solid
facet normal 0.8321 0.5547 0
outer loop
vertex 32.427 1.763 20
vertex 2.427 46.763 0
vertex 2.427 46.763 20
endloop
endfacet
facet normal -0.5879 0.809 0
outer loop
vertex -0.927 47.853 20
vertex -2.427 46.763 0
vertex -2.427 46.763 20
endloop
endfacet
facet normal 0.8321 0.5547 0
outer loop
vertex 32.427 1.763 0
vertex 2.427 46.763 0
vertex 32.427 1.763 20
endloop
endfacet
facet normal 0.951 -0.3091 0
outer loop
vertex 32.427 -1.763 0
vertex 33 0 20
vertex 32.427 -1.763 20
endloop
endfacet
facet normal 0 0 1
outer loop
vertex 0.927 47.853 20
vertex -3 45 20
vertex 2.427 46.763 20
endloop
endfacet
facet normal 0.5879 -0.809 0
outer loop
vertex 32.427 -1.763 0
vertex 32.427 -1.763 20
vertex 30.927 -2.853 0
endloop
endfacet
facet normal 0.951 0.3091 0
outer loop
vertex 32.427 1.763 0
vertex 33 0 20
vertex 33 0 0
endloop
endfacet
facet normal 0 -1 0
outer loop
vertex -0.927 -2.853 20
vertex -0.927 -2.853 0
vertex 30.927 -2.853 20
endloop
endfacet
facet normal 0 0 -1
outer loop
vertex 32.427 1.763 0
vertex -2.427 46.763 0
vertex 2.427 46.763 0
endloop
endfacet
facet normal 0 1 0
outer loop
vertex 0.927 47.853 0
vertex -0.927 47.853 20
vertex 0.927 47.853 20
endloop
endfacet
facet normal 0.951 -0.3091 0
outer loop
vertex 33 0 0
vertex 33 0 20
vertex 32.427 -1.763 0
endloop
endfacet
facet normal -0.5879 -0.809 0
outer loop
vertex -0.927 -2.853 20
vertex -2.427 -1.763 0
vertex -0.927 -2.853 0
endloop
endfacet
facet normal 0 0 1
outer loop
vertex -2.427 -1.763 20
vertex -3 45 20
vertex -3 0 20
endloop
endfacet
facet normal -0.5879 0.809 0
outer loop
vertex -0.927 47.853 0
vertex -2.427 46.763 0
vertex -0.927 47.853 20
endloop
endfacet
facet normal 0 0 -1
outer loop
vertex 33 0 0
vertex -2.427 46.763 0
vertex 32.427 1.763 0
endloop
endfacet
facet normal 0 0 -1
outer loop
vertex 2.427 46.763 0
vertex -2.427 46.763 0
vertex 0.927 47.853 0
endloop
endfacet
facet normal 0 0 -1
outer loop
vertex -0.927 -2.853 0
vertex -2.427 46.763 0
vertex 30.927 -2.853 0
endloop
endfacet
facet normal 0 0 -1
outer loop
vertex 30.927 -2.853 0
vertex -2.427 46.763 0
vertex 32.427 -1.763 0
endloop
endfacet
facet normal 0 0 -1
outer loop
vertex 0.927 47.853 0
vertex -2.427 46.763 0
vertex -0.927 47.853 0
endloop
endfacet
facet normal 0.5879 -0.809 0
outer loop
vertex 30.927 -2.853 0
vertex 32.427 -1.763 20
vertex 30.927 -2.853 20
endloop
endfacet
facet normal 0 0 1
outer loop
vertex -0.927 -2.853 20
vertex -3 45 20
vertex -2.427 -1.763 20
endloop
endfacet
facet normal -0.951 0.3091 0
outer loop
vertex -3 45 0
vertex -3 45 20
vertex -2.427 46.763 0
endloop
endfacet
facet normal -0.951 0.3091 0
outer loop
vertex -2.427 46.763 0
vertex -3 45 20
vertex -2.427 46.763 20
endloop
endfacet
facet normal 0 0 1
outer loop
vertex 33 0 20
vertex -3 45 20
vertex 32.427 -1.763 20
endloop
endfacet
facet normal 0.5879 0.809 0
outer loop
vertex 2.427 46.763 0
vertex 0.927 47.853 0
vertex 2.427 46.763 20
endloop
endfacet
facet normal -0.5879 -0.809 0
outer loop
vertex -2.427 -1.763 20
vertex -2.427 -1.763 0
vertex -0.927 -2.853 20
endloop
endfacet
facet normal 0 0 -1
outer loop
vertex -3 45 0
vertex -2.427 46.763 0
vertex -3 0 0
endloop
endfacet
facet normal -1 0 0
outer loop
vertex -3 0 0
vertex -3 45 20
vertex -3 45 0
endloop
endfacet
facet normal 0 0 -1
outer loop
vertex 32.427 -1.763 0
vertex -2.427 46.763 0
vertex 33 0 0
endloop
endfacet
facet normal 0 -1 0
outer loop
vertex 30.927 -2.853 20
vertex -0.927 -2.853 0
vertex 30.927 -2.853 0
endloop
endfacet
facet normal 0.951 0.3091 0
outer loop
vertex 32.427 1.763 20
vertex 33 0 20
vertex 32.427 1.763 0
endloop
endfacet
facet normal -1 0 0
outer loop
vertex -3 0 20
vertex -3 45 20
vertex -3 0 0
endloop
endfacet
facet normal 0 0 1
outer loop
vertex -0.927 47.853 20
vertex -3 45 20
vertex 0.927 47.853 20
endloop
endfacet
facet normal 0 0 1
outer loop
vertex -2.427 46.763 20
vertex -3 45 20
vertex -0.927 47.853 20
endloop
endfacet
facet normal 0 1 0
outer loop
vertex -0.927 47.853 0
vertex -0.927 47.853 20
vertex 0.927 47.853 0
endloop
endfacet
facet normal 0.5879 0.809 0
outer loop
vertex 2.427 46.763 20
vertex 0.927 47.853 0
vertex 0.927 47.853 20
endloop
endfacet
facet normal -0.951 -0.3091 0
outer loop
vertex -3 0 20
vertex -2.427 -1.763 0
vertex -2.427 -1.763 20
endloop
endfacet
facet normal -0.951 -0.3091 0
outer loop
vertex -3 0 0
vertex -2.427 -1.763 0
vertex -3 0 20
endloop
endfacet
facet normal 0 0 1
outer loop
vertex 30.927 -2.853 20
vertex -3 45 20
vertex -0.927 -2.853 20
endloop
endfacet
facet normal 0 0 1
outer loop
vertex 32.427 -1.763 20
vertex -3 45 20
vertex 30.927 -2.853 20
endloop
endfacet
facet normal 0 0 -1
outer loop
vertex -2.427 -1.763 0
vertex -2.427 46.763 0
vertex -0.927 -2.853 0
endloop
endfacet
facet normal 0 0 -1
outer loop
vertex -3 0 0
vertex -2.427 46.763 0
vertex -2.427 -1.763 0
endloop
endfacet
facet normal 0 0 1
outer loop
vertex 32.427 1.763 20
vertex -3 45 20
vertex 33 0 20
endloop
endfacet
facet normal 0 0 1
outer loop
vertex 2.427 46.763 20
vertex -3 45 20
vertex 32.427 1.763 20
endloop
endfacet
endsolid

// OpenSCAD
module control (base, height, length){
	linear_extrude(height=length)
		polygon([[0,0],[0,height],[base,0]]);
}

/*
base = 30;
height = 50;
length = 10;
control(base, height, length);
*/

module rounded_control(base, height, length, radius){
	hull(){
		cylinder(length, radius, radius);
		translate([base, 0, 0])
			cylinder(length, radius, radius);
		translate([0, height, 0])
			cylinder(length, radius, radius);
	}
}

base = 30;
height = 45;
length = 20;
radius = 3;
rounded_control(base, height, length, radius);
